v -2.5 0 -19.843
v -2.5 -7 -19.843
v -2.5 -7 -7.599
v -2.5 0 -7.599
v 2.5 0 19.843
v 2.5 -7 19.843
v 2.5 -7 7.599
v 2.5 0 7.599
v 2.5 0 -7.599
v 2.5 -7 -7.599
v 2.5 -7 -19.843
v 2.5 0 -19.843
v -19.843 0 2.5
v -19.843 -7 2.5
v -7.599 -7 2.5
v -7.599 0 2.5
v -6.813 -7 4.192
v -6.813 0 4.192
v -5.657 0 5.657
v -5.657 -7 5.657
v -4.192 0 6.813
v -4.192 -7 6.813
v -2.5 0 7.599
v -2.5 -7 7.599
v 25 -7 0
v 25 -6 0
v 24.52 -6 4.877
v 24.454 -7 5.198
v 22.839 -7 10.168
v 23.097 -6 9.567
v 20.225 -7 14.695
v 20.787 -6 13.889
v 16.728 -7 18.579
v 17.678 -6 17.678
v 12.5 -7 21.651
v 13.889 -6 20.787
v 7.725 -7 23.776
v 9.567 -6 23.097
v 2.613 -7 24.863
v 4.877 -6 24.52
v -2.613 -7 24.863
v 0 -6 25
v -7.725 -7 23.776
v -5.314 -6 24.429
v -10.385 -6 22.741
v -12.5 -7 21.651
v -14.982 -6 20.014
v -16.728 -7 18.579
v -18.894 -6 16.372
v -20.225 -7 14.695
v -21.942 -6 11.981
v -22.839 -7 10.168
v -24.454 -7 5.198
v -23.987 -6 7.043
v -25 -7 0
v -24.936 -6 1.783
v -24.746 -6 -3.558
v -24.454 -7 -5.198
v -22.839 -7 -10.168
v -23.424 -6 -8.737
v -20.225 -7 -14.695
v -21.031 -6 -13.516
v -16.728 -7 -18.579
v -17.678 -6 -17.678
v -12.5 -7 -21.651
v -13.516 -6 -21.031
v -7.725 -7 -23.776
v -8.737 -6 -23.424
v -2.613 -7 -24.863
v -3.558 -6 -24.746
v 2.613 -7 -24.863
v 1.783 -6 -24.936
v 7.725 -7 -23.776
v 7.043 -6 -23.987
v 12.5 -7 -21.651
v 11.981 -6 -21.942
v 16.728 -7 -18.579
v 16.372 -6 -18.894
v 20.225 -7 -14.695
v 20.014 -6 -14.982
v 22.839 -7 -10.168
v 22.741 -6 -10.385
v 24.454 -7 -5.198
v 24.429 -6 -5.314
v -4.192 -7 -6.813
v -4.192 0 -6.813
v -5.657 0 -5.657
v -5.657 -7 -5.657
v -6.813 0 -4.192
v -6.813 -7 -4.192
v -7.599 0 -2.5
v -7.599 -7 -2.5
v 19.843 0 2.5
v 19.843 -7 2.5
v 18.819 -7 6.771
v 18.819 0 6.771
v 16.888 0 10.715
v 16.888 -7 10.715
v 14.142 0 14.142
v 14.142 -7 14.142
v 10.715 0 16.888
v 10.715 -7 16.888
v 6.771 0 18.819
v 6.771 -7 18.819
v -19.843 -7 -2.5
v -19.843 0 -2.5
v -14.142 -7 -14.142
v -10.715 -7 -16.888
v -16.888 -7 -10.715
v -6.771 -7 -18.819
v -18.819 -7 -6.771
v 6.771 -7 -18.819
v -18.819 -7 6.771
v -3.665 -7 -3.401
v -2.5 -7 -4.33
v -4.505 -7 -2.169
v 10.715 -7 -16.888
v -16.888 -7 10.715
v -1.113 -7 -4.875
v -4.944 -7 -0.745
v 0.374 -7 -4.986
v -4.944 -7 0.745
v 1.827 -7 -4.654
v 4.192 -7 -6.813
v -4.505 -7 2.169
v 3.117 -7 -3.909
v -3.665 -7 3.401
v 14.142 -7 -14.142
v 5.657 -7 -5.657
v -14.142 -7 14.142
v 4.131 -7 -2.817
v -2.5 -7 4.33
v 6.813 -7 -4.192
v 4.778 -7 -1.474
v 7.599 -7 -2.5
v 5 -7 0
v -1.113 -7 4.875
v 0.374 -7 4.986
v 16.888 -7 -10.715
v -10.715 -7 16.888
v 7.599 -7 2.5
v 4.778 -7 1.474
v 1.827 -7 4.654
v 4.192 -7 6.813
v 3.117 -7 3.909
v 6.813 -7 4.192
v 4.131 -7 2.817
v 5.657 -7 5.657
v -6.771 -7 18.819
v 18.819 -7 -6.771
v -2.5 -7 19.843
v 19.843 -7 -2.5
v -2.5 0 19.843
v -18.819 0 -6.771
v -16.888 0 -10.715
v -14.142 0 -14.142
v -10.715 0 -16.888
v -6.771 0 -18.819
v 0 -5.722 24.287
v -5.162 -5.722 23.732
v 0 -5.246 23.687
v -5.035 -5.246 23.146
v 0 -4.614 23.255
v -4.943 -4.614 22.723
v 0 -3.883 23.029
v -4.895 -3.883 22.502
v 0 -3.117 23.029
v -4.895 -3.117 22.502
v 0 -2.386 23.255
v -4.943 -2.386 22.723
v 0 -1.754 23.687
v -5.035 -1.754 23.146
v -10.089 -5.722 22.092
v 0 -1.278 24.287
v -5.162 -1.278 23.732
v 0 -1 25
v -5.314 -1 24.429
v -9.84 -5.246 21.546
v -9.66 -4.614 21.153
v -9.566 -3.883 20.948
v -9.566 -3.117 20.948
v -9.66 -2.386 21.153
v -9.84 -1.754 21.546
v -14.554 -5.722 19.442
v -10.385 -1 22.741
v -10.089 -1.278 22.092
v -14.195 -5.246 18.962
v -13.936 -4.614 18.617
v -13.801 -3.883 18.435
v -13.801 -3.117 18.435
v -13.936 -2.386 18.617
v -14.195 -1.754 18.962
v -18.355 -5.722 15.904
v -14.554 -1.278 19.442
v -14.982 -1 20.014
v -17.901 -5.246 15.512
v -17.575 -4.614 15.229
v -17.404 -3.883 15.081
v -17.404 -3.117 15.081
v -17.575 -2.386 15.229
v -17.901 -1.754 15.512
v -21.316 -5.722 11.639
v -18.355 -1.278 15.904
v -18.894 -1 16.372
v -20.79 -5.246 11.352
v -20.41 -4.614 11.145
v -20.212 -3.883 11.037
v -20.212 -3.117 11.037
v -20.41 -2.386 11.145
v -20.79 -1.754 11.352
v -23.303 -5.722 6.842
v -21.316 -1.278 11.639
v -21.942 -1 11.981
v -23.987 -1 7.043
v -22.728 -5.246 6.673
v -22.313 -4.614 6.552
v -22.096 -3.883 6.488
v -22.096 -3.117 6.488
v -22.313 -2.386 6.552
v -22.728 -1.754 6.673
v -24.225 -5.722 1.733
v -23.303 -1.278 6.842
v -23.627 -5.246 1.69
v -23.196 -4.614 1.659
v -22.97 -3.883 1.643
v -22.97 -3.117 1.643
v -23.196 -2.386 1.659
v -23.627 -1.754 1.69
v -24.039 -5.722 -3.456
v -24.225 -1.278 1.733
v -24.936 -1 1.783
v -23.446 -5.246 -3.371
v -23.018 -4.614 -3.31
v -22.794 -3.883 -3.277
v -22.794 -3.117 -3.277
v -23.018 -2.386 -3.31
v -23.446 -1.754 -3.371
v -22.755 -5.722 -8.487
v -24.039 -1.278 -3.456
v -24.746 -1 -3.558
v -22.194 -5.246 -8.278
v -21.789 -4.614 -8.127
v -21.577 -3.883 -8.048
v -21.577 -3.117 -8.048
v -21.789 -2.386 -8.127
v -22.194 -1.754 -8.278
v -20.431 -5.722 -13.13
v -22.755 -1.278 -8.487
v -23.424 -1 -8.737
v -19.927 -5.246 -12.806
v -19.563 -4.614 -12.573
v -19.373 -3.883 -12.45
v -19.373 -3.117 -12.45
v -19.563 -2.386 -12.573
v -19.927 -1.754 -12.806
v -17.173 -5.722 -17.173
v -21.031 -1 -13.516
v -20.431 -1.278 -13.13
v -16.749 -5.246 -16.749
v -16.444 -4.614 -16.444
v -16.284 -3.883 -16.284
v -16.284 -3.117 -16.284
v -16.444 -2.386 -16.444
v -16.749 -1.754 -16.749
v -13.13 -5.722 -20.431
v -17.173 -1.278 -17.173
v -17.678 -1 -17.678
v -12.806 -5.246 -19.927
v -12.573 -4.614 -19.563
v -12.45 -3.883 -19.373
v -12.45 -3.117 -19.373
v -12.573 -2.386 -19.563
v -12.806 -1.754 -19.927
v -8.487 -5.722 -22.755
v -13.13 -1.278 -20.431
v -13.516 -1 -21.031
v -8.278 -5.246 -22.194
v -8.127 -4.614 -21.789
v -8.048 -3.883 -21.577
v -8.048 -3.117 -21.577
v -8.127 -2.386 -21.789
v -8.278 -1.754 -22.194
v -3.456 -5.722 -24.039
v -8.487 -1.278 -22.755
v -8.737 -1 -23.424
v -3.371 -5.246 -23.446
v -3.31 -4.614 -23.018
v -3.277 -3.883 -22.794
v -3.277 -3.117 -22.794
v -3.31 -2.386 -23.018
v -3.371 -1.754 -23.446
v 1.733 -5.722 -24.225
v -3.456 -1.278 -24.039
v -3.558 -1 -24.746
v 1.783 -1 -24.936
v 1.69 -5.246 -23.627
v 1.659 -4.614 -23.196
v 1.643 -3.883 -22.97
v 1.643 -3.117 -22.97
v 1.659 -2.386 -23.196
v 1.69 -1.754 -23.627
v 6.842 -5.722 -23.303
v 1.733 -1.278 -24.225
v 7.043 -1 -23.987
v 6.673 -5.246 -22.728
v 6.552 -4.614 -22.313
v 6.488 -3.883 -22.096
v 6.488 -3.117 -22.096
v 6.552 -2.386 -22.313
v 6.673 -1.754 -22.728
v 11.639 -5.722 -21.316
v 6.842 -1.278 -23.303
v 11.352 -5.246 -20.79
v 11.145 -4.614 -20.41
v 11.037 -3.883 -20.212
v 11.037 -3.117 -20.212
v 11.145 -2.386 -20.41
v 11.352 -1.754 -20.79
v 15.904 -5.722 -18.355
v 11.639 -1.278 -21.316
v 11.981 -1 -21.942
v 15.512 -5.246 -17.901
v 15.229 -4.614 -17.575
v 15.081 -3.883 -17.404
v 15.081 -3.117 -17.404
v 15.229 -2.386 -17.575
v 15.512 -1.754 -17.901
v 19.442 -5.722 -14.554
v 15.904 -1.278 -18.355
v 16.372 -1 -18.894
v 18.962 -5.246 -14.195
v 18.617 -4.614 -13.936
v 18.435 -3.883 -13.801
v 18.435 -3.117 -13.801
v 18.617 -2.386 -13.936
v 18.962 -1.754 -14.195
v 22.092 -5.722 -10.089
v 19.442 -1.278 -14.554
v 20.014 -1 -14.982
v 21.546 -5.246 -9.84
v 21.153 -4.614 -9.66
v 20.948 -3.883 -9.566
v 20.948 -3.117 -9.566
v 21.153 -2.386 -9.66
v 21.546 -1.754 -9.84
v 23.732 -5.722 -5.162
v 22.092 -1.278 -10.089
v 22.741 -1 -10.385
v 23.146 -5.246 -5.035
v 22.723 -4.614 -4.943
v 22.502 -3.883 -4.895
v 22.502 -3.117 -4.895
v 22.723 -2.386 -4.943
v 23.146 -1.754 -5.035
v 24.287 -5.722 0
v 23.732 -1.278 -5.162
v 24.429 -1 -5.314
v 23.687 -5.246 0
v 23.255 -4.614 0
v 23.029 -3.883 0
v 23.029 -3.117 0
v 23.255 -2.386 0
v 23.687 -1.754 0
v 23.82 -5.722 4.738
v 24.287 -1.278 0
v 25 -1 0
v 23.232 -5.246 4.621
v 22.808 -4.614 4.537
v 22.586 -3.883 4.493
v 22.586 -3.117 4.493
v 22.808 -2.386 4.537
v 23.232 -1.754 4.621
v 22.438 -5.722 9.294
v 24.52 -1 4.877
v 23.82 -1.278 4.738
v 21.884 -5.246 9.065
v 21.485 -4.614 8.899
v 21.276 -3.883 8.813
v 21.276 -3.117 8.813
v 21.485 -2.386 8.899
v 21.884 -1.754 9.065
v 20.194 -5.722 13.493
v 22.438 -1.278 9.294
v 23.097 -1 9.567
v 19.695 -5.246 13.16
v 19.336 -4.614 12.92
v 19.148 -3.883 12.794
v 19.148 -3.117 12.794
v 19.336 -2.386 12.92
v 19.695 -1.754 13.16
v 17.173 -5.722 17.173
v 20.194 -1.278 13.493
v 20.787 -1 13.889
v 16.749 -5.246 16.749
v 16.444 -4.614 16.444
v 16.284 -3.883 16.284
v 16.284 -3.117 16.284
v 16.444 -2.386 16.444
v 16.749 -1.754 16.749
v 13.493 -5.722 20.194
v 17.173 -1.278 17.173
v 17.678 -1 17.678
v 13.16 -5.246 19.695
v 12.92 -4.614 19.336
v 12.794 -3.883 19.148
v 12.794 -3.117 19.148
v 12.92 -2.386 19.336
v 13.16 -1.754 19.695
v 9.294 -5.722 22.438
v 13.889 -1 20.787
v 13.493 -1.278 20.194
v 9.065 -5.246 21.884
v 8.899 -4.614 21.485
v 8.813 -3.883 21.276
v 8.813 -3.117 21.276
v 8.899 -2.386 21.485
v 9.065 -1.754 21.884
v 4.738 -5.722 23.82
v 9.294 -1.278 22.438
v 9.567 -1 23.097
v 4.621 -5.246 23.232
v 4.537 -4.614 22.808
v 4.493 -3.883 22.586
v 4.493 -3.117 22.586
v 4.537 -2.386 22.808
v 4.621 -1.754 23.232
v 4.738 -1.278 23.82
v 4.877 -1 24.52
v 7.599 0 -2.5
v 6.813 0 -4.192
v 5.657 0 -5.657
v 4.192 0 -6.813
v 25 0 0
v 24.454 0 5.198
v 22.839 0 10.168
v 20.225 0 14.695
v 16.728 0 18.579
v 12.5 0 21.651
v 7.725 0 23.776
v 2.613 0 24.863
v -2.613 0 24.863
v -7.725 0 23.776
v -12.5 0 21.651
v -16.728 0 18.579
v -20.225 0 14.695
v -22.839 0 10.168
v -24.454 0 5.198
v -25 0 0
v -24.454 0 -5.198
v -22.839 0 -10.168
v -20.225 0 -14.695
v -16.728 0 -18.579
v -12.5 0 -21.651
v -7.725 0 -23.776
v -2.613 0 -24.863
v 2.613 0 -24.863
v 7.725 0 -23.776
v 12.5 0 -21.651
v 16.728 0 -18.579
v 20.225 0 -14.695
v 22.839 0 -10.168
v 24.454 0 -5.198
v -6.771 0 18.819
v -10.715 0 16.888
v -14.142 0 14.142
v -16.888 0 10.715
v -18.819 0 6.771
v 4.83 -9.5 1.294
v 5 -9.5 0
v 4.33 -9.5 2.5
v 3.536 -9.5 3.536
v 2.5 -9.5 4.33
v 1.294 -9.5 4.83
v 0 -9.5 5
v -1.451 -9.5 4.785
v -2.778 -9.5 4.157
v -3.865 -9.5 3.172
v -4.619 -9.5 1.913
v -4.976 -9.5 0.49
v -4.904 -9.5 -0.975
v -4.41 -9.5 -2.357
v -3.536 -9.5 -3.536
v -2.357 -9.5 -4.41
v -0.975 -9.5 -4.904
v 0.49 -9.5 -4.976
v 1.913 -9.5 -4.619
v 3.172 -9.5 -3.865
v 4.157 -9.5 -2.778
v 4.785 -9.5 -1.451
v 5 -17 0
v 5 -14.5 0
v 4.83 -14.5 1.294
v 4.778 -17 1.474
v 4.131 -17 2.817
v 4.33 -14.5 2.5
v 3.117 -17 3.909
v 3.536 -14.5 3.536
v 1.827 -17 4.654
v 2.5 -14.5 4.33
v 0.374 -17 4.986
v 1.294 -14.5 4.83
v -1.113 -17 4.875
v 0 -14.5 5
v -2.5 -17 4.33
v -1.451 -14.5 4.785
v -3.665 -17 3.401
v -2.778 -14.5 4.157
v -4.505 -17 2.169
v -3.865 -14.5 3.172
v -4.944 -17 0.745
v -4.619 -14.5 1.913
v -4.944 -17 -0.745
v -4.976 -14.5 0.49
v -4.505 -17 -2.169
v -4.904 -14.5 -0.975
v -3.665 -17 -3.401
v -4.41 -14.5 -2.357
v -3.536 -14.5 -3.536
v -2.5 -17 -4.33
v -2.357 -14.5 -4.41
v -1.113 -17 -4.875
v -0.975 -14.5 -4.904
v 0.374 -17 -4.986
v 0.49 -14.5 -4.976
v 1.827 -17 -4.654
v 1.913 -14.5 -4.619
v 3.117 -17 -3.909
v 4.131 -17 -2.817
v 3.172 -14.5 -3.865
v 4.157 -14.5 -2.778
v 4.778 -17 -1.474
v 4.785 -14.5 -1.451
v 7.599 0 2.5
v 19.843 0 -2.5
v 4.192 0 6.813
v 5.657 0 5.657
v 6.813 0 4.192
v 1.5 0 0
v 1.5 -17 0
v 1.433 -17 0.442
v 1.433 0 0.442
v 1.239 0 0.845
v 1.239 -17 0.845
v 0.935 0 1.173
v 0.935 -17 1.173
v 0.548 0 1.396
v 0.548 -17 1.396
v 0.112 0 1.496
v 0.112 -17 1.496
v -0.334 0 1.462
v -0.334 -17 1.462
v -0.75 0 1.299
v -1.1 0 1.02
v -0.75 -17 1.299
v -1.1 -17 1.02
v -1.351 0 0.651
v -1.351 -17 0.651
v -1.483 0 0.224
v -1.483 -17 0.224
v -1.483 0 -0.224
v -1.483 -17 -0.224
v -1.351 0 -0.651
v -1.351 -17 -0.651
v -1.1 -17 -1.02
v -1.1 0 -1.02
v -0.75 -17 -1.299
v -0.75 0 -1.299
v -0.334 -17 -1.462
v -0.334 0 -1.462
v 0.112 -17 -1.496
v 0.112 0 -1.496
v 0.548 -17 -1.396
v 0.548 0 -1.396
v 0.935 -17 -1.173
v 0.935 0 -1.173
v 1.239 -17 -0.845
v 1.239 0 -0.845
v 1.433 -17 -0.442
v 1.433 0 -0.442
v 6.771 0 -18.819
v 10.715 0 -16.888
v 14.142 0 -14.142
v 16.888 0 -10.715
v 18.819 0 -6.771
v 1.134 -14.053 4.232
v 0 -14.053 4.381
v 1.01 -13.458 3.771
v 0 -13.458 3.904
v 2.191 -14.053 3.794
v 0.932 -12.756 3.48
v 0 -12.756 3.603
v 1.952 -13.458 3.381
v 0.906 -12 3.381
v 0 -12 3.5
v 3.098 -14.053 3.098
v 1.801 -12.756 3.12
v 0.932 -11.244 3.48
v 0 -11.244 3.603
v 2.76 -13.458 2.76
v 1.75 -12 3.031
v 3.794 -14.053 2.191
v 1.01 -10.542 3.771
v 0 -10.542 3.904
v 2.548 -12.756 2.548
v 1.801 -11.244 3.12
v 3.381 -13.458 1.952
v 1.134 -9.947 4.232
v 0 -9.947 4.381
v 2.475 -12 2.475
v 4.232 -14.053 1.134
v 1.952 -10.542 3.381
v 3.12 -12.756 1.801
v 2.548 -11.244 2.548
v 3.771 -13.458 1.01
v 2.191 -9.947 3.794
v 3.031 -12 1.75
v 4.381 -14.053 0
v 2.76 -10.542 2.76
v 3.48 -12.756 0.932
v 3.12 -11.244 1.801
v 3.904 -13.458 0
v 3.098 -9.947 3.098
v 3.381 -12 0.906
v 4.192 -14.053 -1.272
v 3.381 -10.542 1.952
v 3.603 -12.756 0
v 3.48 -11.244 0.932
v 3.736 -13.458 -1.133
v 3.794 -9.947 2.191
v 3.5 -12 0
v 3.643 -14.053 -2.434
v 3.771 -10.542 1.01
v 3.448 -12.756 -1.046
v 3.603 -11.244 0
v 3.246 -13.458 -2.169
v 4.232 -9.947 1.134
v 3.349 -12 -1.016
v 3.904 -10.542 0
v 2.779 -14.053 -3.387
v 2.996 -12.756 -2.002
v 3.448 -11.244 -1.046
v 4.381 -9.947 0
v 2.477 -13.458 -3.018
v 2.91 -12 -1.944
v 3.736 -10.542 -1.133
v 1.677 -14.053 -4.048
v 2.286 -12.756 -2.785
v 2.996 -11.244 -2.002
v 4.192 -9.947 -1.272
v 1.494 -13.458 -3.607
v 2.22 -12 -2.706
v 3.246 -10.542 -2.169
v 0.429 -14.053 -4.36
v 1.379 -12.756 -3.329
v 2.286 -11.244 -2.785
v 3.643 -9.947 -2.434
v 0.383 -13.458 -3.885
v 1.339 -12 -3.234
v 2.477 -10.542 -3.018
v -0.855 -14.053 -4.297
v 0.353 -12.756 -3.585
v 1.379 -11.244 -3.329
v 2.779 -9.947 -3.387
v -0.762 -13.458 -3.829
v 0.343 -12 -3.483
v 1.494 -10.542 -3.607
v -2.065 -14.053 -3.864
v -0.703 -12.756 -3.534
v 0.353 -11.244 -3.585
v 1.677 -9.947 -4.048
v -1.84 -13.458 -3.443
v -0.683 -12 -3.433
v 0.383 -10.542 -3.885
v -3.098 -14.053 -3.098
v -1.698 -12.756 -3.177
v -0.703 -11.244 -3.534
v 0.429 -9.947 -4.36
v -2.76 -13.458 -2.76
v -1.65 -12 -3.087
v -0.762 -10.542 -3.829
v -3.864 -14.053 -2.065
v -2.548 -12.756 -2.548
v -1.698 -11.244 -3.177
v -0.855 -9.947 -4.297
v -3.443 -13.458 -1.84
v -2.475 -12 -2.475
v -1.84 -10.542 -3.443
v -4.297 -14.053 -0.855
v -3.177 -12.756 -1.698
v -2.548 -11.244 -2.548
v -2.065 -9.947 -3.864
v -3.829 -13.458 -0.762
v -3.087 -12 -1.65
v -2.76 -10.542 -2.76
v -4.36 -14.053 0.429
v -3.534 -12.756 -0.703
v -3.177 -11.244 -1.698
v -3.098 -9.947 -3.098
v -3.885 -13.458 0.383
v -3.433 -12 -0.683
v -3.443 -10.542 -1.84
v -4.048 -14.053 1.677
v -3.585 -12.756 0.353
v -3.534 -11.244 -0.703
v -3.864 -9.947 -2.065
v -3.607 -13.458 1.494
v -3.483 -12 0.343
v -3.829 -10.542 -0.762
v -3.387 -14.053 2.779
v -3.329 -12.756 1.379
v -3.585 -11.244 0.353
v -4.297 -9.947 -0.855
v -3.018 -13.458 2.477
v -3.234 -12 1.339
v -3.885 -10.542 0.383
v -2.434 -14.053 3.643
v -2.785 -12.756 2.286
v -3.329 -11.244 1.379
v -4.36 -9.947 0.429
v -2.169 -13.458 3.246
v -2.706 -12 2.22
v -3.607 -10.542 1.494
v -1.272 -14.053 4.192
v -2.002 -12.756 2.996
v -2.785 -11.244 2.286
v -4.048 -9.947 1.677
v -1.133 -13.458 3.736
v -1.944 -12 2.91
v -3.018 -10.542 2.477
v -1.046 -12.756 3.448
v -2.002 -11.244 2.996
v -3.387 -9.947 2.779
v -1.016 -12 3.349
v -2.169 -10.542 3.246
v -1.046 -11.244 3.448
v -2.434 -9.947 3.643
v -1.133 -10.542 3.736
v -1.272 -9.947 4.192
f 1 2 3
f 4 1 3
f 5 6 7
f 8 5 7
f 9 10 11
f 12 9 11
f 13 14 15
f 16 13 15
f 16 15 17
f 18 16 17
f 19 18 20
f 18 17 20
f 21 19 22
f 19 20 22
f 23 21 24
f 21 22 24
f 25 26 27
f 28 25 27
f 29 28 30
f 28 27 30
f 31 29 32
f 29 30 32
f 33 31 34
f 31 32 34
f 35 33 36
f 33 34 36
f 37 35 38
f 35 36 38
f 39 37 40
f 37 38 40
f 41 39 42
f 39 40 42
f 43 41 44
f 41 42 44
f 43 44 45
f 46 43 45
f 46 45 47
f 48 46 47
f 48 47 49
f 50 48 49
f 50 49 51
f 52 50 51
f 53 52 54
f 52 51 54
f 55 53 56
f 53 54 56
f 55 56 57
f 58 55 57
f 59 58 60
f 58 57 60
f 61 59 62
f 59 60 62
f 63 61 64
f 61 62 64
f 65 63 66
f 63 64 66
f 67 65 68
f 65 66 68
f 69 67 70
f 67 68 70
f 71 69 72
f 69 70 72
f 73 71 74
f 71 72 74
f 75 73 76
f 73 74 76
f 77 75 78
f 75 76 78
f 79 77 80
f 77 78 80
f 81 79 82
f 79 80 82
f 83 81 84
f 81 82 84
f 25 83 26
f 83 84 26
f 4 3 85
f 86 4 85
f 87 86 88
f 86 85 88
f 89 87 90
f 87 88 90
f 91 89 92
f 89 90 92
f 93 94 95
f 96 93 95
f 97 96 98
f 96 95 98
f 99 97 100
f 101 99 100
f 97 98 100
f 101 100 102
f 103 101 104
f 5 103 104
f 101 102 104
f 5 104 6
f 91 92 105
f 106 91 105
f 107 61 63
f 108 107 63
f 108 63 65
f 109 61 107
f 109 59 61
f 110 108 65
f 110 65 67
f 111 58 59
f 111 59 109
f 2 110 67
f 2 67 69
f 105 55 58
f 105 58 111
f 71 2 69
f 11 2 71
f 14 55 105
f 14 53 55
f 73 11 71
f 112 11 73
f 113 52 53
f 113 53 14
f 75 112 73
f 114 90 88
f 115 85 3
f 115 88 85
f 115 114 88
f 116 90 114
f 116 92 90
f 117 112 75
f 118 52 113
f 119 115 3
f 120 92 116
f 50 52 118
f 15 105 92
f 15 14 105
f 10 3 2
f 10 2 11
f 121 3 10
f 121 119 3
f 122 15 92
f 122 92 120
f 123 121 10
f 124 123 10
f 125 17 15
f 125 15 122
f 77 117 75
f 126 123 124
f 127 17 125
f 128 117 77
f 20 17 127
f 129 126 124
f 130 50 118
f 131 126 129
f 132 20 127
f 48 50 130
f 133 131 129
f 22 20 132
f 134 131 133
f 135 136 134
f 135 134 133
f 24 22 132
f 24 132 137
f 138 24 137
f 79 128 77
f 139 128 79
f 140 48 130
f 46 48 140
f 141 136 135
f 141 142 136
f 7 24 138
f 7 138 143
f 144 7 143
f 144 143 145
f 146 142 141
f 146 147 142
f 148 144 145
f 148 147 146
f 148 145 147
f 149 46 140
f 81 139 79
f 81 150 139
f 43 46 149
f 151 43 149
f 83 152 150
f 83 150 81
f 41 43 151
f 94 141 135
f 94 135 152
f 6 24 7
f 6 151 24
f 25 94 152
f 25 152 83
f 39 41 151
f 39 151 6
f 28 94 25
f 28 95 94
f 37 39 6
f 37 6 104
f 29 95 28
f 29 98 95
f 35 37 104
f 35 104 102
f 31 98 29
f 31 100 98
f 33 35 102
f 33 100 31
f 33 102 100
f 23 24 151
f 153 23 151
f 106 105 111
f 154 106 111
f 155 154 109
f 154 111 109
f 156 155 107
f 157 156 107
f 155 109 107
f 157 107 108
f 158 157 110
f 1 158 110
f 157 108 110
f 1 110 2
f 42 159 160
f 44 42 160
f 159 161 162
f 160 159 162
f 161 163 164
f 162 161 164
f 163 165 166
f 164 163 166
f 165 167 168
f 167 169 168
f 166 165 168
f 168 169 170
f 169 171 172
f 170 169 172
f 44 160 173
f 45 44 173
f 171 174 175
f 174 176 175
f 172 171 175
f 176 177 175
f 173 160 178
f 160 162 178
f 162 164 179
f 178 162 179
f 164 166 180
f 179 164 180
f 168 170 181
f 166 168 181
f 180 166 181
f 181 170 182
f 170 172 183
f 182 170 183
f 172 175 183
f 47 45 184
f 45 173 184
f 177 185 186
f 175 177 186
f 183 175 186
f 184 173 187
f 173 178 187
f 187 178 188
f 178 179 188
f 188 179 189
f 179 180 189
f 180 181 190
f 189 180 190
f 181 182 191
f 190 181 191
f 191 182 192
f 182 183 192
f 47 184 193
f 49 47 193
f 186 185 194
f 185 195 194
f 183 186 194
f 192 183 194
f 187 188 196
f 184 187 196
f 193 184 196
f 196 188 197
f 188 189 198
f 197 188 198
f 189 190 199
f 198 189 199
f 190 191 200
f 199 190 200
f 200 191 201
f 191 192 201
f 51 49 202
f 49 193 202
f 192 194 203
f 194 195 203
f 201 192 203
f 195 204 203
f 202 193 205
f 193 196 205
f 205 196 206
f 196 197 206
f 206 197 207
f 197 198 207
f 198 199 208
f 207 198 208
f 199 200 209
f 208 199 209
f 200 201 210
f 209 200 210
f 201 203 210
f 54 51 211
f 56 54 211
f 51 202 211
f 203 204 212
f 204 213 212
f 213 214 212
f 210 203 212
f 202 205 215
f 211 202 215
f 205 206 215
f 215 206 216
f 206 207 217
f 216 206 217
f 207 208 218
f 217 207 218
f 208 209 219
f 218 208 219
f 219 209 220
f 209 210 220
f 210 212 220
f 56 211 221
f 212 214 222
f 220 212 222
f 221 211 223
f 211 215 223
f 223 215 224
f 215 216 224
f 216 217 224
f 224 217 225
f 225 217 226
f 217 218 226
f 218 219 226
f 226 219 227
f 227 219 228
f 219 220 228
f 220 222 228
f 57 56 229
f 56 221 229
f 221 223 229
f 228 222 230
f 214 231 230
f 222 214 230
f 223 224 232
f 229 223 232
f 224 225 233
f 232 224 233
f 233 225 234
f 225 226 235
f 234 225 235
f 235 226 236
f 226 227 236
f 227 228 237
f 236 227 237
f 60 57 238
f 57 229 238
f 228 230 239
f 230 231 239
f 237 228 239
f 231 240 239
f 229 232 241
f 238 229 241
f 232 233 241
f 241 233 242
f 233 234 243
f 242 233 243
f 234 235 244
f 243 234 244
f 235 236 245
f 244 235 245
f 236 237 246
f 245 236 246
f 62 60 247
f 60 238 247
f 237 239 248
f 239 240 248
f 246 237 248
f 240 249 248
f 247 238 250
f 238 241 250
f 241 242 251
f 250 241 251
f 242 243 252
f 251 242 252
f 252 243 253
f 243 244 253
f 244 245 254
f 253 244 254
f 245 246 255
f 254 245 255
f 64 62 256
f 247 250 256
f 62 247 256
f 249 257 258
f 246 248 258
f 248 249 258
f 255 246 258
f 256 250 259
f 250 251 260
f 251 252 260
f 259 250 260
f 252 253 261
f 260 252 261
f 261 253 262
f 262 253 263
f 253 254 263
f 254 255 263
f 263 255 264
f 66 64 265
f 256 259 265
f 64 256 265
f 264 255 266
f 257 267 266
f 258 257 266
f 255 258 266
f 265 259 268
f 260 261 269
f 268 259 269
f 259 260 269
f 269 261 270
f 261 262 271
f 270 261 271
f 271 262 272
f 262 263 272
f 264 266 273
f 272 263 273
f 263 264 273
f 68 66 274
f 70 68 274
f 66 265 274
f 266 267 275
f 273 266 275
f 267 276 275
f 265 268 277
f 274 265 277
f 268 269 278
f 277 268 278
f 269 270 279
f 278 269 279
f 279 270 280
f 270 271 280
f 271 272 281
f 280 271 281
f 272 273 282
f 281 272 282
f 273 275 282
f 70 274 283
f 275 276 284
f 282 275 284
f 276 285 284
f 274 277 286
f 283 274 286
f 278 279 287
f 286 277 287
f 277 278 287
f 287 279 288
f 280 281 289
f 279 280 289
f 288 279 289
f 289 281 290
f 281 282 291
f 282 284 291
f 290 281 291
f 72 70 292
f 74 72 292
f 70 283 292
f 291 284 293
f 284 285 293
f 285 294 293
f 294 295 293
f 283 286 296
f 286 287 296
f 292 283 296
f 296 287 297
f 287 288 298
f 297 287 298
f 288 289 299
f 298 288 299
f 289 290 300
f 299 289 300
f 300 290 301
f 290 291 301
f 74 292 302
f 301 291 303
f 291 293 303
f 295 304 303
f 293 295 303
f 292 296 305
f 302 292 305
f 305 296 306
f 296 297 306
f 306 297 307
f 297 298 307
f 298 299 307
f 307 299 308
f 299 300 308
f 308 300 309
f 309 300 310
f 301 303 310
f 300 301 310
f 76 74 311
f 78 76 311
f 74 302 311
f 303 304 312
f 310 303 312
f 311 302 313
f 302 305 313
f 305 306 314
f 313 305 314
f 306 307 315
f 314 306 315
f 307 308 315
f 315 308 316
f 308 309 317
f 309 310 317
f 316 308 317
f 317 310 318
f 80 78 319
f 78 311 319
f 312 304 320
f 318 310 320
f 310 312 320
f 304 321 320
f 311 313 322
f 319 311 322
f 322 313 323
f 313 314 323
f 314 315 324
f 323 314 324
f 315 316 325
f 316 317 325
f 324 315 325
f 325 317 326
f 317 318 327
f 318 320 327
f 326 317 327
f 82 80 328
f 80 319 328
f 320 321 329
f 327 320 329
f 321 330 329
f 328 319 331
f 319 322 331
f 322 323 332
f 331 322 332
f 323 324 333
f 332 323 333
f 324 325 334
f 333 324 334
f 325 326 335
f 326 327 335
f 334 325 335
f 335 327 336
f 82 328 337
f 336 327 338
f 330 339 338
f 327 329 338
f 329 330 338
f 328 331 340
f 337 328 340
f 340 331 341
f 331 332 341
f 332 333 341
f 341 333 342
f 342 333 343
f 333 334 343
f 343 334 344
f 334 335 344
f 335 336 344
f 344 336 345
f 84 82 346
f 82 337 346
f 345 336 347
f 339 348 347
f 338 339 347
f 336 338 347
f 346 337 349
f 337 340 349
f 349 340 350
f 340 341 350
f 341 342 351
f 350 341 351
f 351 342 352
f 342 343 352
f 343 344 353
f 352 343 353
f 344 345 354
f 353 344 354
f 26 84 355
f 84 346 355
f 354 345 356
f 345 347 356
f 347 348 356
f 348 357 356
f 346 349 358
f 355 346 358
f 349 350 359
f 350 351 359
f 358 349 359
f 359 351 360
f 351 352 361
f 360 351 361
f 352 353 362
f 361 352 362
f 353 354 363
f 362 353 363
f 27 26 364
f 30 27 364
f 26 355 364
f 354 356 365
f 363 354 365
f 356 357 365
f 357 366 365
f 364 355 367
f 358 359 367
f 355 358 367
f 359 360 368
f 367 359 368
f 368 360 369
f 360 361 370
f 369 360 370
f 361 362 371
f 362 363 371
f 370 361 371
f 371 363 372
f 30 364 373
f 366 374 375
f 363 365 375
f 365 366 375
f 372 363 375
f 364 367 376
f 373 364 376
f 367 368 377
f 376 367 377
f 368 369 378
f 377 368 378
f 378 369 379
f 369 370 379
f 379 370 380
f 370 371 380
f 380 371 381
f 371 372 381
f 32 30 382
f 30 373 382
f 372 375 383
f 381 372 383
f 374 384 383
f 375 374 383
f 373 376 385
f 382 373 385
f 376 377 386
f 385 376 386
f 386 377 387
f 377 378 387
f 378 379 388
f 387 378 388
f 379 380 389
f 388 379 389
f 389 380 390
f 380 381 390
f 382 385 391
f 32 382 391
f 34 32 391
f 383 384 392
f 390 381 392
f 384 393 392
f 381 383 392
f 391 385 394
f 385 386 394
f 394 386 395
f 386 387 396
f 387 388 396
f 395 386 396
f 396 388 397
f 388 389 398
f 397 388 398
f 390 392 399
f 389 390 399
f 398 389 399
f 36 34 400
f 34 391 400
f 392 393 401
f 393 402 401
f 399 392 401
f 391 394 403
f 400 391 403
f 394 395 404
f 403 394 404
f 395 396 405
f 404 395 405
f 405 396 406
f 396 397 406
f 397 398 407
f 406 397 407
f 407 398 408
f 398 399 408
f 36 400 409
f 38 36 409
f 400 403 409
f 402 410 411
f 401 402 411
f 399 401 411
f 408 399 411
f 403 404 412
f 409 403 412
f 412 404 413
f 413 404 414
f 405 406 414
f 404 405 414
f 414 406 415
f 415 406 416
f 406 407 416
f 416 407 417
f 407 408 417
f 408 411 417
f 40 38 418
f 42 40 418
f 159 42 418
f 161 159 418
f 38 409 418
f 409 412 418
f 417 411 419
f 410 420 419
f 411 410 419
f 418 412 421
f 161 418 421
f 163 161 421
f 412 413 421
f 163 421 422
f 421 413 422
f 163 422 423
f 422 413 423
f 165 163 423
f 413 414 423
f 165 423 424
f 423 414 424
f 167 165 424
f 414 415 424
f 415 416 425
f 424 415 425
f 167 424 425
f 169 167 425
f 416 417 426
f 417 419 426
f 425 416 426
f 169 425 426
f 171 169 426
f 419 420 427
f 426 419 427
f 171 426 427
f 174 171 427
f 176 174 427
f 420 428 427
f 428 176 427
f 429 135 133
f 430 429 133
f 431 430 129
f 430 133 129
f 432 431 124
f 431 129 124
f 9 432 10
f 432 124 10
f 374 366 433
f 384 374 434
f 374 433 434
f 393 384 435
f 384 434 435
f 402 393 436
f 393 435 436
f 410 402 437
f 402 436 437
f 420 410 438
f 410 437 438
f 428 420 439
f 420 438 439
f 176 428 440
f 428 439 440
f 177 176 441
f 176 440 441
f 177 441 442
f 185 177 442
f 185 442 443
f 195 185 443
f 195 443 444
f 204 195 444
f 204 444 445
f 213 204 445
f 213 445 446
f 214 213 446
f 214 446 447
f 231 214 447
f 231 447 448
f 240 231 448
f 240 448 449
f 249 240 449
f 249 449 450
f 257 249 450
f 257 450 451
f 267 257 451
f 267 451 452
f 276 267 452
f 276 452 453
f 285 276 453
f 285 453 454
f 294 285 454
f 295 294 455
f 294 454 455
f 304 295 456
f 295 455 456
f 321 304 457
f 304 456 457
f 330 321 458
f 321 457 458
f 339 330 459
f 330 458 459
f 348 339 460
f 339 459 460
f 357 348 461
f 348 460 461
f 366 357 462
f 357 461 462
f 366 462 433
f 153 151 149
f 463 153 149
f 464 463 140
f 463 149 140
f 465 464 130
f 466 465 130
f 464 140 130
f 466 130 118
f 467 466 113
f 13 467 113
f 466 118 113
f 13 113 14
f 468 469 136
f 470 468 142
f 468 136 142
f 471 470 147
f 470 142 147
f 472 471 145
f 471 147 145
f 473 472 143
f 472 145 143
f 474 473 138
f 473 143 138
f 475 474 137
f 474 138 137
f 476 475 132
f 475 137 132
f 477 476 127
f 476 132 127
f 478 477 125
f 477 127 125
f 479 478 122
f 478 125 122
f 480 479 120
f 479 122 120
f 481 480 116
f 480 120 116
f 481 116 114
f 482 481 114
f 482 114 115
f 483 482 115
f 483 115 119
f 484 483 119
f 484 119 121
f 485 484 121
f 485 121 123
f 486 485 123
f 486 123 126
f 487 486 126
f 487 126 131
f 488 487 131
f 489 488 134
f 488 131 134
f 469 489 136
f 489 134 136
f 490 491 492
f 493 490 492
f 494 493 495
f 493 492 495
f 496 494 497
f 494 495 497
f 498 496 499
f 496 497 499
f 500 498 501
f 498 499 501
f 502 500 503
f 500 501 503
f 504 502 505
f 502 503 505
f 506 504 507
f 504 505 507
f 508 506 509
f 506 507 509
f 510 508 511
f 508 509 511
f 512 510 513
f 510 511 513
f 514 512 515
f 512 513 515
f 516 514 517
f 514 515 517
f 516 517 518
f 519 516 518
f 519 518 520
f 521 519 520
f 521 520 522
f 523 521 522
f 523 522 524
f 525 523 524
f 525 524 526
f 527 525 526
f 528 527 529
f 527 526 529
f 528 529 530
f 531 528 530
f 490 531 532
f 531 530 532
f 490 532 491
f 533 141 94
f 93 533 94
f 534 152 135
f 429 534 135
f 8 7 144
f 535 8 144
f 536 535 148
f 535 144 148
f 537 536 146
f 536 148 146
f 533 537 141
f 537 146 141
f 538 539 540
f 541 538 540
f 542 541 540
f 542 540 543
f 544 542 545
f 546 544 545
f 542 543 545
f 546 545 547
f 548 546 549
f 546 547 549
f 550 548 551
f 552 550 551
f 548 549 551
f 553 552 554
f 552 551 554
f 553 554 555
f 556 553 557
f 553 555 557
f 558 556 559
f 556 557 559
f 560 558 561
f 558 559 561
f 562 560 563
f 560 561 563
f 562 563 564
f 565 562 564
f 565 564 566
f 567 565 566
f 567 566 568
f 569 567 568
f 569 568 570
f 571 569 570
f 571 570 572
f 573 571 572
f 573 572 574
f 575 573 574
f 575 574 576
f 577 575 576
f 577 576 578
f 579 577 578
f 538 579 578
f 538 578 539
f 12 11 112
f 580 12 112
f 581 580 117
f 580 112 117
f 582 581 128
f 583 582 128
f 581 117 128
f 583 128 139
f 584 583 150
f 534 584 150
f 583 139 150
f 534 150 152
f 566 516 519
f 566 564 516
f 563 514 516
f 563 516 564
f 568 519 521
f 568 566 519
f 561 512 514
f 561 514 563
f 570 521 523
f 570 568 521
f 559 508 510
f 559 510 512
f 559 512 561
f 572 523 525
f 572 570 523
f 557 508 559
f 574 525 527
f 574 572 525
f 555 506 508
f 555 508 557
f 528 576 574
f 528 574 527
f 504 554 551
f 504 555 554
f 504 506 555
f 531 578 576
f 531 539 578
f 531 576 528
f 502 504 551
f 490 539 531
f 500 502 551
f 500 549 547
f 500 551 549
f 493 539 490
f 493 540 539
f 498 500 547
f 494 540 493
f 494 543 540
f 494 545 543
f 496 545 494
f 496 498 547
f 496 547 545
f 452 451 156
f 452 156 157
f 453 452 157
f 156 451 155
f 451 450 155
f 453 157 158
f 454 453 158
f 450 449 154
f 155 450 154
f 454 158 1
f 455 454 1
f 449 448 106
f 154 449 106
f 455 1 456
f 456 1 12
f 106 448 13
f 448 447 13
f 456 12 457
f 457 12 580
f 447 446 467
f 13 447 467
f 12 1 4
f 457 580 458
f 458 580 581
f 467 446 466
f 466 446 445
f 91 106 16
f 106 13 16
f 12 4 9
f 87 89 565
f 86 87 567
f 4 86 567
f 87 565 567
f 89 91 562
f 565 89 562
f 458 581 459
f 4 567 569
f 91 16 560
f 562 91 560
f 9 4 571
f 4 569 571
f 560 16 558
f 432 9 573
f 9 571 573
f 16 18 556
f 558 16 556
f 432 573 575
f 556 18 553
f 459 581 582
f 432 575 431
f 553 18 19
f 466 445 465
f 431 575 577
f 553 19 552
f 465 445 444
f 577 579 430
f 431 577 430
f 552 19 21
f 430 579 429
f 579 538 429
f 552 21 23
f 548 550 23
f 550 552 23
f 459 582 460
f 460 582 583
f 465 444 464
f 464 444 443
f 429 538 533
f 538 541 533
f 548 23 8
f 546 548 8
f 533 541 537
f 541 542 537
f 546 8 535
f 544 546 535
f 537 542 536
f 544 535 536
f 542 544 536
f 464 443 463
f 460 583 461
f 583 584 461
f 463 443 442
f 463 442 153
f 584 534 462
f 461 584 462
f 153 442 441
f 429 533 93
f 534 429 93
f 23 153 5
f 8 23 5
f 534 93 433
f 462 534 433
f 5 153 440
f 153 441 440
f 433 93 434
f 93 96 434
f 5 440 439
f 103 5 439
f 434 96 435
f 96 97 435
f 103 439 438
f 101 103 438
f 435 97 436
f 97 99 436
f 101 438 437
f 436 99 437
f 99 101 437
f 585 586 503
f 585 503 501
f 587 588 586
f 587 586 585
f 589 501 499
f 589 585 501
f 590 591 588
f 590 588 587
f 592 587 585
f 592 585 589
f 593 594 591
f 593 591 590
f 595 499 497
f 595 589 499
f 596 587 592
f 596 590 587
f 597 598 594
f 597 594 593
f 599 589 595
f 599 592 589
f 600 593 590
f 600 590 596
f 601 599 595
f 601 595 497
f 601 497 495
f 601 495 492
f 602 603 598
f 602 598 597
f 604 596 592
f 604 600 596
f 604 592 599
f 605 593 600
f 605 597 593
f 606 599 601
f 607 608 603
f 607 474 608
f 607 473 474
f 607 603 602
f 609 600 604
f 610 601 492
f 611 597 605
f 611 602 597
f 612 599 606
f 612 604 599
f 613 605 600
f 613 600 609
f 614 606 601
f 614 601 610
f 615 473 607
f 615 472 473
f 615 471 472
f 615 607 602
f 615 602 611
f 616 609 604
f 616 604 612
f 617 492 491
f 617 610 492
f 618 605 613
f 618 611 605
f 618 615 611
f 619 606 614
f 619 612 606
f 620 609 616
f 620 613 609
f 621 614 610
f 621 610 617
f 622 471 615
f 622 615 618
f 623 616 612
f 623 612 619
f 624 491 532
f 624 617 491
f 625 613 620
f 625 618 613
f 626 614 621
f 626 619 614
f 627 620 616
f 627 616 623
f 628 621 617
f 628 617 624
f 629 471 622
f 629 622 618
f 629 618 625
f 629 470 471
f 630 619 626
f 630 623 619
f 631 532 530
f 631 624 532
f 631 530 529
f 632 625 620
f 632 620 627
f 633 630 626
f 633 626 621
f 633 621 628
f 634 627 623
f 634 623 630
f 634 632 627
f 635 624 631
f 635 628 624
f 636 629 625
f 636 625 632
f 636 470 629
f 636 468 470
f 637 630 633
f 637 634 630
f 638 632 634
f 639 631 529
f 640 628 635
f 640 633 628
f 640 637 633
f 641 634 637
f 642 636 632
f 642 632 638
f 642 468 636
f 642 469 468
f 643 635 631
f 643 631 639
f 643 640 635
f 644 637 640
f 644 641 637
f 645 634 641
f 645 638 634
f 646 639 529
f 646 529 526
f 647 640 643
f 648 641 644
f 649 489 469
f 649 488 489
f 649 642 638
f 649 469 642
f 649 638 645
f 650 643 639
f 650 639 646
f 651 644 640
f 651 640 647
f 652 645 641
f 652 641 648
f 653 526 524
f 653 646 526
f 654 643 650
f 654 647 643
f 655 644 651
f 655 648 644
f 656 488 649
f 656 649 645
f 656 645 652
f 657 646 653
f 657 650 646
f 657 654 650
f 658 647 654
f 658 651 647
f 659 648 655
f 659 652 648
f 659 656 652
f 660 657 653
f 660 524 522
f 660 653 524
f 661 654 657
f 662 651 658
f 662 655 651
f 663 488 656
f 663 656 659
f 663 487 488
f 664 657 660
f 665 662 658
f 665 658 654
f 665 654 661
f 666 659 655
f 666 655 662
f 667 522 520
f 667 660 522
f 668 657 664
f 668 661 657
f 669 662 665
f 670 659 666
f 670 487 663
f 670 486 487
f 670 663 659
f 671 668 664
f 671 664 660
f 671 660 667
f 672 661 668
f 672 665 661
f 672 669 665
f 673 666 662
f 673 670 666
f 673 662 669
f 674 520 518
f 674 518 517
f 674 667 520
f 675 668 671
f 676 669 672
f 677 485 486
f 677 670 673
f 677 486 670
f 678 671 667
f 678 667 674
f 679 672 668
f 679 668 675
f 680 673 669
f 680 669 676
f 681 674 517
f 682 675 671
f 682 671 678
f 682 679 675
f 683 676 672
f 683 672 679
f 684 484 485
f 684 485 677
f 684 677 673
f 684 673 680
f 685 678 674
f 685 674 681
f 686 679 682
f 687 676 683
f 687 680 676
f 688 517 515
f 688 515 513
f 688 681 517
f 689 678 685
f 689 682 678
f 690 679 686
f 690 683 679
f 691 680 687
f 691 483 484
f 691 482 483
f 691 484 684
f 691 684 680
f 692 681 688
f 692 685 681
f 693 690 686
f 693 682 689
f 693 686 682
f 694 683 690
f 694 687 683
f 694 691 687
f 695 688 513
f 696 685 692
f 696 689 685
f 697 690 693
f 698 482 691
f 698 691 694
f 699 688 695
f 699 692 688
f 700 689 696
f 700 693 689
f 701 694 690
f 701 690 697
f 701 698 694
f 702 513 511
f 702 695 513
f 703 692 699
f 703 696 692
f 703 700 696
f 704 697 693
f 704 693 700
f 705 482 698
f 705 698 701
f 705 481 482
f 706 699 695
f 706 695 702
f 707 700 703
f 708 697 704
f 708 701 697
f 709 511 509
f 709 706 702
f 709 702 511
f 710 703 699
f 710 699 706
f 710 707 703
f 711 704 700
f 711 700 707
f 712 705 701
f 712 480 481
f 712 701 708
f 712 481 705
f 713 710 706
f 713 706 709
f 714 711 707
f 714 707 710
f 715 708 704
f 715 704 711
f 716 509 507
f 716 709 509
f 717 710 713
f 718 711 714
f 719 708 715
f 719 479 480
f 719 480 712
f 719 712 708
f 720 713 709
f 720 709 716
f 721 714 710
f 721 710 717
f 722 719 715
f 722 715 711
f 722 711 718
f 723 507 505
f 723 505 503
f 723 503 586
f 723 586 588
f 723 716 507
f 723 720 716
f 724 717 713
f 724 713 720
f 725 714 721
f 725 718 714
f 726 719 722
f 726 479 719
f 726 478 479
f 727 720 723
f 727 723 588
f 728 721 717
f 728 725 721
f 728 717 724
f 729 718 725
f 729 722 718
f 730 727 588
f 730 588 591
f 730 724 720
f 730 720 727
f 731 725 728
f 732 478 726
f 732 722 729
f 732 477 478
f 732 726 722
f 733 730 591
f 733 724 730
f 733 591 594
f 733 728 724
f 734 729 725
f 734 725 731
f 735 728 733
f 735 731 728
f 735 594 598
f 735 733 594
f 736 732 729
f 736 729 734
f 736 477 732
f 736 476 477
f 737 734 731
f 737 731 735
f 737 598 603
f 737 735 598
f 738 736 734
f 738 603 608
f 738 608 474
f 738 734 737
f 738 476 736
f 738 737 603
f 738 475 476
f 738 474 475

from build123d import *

# Parameters (mm, degrees)
F0_R      = 25
F1_DEPTH  = 7
F5_R      = 5
F6_DEPTH  = 10
F10_R     = 1.5
F11_DEPTH = 17.001
F13_DEPTH = 7.001


with BuildPart() as f1:
    # F0 (on Front) → F1 (new body)
    with BuildSketch(Plane.XZ):
        Circle(F0_R)
    extrude(amount=F1_DEPTH)

    # F2 (on Right) → F4 (revolve, cut)
    with BuildSketch(Plane.YZ):
        with BuildLine():
            Line((-1, 25), (-6, 25))
            ThreePointArc((-6, 25), (-3.5, 23), (-1, 25))
        make_face()
    revolve(axis=Axis((0, -8.172696, 0), (0, -1, 0)), mode=Mode.SUBTRACT)

    # F5 (on face) → F6 (join)
    with BuildSketch(Plane.XZ.offset(7)):
        Circle(F5_R)
    extrude(amount=F6_DEPTH)

    # F8 (on Right) → F9 (revolve, cut)
    with BuildSketch(Plane.YZ):
        with BuildLine():
            ThreePointArc((-14.5, 5), (-12, 3.5), (-9.5, 5))
            Line((-9.5, 5), (-14.5, 5))
        make_face()
    revolve(axis=Axis((0, -11.272511, 0), (0, 1, 0)), mode=Mode.SUBTRACT)

    # F10 (on face) → F11 (cut, through all)
    with BuildSketch(Plane.XZ.offset(17)):
        Circle(F10_R)
    extrude(amount=-F11_DEPTH, mode=Mode.SUBTRACT)

    # F12 (on face) → F13 (cut, through all)
    with BuildSketch(Plane.XZ.offset(7)):
        with BuildLine():
            Line((-2.5, 7.599342), (-2.5, 19.843135))
            ThreePointArc((-2.5, 19.843135), (-14.142136, 14.142136), (-19.843135, 2.5))
            Line((-19.843135, 2.5), (-7.599342, 2.5))
            ThreePointArc((-7.599342, 2.5), (-5.656854, 5.656854), (-2.5, 7.599342))
        make_face()
        with BuildLine():
            Line((7.599342, 2.5), (19.843135, 2.5))
            ThreePointArc((19.843135, 2.5), (14.142136, 14.142136), (2.5, 19.843135))
            Line((2.5, 19.843135), (2.5, 7.599342))
            ThreePointArc((2.5, 7.599342), (5.656854, 5.656854), (7.599342, 2.5))
        make_face()
        with BuildLine():
            ThreePointArc((2.5, -19.843135), (14.142136, -14.142136), (19.843135, -2.5))
            Line((19.843135, -2.5), (7.599342, -2.5))
            ThreePointArc((7.599342, -2.5), (5.656854, -5.656854), (2.5, -7.599342))
            Line((2.5, -7.599342), (2.5, -19.843135))
        make_face()
        with BuildLine():
            Line((-2.5, -19.843135), (-2.5, -7.599342))
            ThreePointArc((-2.5, -7.599342), (-5.656854, -5.656854), (-7.599342, -2.5))
            Line((-7.599342, -2.5), (-19.843135, -2.5))
            ThreePointArc((-19.843135, -2.5), (-14.142136, -14.142136), (-2.5, -19.843135))
        make_face()
    extrude(amount=-F13_DEPTH, mode=Mode.SUBTRACT)


solid = f1.part
